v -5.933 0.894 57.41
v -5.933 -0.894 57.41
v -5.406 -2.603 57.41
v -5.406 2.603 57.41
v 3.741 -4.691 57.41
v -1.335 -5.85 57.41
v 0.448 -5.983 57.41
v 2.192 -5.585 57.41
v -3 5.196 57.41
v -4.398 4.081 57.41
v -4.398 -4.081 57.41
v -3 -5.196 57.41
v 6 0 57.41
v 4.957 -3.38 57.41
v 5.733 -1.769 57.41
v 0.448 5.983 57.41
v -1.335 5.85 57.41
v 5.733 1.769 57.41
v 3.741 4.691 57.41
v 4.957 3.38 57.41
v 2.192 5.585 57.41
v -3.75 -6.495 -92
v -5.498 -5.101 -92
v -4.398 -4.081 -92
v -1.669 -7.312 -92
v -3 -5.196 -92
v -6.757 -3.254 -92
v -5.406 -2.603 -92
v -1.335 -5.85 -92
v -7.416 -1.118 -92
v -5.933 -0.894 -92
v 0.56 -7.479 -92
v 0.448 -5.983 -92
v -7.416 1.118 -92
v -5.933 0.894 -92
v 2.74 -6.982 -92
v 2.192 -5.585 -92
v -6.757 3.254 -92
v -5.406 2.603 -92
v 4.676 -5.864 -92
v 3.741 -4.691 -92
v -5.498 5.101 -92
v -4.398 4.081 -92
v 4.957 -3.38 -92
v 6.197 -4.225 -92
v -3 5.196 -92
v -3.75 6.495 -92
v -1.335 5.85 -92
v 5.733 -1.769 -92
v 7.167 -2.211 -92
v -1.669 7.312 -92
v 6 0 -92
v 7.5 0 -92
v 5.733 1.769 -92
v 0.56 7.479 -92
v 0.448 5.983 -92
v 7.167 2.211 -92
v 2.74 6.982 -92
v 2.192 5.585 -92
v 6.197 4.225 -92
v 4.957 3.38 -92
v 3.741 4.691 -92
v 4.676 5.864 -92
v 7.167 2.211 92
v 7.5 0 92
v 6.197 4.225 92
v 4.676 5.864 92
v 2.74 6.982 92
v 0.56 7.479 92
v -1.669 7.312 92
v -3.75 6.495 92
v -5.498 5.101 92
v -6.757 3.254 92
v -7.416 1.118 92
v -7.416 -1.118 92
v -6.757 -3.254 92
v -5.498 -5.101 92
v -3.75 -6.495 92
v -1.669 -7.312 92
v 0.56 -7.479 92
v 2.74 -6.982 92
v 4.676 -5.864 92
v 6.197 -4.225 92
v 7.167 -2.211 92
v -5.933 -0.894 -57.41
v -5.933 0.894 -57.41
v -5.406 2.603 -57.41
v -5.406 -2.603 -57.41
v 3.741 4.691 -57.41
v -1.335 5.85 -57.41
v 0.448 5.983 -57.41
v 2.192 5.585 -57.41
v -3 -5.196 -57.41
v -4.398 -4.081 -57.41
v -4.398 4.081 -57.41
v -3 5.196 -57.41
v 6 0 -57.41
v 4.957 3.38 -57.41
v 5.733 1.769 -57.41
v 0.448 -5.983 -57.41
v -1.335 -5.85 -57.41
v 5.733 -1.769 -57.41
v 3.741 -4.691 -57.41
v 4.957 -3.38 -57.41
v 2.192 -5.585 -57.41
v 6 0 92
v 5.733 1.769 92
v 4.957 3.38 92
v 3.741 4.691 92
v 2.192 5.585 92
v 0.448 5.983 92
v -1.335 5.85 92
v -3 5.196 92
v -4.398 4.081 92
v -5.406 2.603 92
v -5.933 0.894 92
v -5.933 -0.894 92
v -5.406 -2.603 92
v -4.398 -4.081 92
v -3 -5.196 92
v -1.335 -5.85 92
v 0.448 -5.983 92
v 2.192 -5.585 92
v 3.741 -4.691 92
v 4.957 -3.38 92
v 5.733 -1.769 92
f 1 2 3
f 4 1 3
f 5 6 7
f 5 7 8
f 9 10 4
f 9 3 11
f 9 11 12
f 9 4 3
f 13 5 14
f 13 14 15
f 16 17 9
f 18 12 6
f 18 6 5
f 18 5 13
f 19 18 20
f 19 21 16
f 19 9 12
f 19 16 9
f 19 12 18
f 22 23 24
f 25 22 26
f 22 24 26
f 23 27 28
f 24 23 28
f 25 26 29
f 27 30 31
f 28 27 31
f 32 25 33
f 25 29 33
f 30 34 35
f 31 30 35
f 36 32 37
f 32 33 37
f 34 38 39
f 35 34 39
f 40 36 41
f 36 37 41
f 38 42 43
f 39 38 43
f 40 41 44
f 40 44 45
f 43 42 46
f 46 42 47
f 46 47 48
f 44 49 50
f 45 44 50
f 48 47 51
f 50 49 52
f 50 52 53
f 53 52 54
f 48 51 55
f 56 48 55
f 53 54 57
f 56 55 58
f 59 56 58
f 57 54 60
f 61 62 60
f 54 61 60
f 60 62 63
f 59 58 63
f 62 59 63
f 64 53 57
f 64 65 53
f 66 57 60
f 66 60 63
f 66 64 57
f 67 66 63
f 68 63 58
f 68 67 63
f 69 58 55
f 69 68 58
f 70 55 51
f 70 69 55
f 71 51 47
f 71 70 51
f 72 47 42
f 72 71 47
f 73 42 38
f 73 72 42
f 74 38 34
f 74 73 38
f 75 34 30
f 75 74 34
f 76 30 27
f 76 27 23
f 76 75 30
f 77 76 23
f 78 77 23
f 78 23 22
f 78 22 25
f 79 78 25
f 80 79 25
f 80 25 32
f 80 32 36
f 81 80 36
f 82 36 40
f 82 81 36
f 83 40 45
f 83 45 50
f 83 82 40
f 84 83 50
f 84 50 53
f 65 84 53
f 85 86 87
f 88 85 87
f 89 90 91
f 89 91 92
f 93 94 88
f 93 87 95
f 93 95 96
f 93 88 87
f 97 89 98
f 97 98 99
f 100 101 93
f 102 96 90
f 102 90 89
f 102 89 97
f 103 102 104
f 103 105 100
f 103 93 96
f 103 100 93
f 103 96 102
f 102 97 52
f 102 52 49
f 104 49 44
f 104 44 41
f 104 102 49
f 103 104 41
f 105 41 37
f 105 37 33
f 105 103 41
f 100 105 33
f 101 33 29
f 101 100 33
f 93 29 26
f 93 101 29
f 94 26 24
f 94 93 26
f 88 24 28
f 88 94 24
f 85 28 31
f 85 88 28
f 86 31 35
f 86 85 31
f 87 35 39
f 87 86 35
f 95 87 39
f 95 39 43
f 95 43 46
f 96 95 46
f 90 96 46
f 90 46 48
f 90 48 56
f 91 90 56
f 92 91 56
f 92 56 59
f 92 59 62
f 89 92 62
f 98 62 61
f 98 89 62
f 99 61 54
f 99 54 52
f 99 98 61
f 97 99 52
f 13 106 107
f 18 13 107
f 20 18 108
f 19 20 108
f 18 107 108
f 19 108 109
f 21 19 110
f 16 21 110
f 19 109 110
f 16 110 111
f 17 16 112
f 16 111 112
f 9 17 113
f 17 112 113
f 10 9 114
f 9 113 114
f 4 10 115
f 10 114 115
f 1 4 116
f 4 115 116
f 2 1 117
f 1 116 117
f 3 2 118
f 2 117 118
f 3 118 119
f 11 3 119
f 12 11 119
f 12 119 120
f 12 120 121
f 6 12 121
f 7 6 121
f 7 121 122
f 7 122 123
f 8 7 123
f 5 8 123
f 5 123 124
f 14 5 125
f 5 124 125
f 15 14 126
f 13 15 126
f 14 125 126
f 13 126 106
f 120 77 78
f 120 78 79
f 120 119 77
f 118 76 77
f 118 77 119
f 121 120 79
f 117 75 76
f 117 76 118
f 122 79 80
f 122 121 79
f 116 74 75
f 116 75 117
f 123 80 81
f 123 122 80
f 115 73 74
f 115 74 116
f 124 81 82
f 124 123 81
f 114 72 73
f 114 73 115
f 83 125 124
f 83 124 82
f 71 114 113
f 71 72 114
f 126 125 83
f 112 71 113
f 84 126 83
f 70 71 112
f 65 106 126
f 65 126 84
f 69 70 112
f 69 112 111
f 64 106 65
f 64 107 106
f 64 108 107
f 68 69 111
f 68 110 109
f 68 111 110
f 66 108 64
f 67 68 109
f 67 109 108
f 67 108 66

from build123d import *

# Parameters (mm, degrees)
SKETCH_1_R          = 7.5
EXTRUDE_1_DEPTH     = 92
SKETCH_2_R          = 6
CUT_EXTRUDE_1_DEPTH = 34.59
CUT_EXTRUDE_START   = -34.59
SKETCH_3_R          = 6
CUT_EXTRUDE_2_DEPTH = 34.59


with BuildPart() as part:
    # 스케치1 → 보스-돌출1 (new, symmetric)
    with BuildSketch(Plane.XY):
        Circle(SKETCH_1_R)
    extrude(amount=EXTRUDE_1_DEPTH, both=True)

    # 스케치2 → 컷-돌출1 (cut)
    with BuildSketch(Plane.XY.offset(92)):
        Circle(SKETCH_2_R)
    extrude(amount=-CUT_EXTRUDE_1_DEPTH, mode=Mode.SUBTRACT)

    # 스케치3 → 컷-돌출2 (cut)
    with BuildSketch(Plane(origin=(0, 0, -92), x_dir=(-1, 0, 0), z_dir=(0, 0, -1)).offset(CUT_EXTRUDE_START)):
        with Locations(Location((0, 0, 0), (0, 0, 180))):
            Circle(SKETCH_3_R)
    extrude(amount=CUT_EXTRUDE_2_DEPTH, mode=Mode.SUBTRACT)


solid = part.part
